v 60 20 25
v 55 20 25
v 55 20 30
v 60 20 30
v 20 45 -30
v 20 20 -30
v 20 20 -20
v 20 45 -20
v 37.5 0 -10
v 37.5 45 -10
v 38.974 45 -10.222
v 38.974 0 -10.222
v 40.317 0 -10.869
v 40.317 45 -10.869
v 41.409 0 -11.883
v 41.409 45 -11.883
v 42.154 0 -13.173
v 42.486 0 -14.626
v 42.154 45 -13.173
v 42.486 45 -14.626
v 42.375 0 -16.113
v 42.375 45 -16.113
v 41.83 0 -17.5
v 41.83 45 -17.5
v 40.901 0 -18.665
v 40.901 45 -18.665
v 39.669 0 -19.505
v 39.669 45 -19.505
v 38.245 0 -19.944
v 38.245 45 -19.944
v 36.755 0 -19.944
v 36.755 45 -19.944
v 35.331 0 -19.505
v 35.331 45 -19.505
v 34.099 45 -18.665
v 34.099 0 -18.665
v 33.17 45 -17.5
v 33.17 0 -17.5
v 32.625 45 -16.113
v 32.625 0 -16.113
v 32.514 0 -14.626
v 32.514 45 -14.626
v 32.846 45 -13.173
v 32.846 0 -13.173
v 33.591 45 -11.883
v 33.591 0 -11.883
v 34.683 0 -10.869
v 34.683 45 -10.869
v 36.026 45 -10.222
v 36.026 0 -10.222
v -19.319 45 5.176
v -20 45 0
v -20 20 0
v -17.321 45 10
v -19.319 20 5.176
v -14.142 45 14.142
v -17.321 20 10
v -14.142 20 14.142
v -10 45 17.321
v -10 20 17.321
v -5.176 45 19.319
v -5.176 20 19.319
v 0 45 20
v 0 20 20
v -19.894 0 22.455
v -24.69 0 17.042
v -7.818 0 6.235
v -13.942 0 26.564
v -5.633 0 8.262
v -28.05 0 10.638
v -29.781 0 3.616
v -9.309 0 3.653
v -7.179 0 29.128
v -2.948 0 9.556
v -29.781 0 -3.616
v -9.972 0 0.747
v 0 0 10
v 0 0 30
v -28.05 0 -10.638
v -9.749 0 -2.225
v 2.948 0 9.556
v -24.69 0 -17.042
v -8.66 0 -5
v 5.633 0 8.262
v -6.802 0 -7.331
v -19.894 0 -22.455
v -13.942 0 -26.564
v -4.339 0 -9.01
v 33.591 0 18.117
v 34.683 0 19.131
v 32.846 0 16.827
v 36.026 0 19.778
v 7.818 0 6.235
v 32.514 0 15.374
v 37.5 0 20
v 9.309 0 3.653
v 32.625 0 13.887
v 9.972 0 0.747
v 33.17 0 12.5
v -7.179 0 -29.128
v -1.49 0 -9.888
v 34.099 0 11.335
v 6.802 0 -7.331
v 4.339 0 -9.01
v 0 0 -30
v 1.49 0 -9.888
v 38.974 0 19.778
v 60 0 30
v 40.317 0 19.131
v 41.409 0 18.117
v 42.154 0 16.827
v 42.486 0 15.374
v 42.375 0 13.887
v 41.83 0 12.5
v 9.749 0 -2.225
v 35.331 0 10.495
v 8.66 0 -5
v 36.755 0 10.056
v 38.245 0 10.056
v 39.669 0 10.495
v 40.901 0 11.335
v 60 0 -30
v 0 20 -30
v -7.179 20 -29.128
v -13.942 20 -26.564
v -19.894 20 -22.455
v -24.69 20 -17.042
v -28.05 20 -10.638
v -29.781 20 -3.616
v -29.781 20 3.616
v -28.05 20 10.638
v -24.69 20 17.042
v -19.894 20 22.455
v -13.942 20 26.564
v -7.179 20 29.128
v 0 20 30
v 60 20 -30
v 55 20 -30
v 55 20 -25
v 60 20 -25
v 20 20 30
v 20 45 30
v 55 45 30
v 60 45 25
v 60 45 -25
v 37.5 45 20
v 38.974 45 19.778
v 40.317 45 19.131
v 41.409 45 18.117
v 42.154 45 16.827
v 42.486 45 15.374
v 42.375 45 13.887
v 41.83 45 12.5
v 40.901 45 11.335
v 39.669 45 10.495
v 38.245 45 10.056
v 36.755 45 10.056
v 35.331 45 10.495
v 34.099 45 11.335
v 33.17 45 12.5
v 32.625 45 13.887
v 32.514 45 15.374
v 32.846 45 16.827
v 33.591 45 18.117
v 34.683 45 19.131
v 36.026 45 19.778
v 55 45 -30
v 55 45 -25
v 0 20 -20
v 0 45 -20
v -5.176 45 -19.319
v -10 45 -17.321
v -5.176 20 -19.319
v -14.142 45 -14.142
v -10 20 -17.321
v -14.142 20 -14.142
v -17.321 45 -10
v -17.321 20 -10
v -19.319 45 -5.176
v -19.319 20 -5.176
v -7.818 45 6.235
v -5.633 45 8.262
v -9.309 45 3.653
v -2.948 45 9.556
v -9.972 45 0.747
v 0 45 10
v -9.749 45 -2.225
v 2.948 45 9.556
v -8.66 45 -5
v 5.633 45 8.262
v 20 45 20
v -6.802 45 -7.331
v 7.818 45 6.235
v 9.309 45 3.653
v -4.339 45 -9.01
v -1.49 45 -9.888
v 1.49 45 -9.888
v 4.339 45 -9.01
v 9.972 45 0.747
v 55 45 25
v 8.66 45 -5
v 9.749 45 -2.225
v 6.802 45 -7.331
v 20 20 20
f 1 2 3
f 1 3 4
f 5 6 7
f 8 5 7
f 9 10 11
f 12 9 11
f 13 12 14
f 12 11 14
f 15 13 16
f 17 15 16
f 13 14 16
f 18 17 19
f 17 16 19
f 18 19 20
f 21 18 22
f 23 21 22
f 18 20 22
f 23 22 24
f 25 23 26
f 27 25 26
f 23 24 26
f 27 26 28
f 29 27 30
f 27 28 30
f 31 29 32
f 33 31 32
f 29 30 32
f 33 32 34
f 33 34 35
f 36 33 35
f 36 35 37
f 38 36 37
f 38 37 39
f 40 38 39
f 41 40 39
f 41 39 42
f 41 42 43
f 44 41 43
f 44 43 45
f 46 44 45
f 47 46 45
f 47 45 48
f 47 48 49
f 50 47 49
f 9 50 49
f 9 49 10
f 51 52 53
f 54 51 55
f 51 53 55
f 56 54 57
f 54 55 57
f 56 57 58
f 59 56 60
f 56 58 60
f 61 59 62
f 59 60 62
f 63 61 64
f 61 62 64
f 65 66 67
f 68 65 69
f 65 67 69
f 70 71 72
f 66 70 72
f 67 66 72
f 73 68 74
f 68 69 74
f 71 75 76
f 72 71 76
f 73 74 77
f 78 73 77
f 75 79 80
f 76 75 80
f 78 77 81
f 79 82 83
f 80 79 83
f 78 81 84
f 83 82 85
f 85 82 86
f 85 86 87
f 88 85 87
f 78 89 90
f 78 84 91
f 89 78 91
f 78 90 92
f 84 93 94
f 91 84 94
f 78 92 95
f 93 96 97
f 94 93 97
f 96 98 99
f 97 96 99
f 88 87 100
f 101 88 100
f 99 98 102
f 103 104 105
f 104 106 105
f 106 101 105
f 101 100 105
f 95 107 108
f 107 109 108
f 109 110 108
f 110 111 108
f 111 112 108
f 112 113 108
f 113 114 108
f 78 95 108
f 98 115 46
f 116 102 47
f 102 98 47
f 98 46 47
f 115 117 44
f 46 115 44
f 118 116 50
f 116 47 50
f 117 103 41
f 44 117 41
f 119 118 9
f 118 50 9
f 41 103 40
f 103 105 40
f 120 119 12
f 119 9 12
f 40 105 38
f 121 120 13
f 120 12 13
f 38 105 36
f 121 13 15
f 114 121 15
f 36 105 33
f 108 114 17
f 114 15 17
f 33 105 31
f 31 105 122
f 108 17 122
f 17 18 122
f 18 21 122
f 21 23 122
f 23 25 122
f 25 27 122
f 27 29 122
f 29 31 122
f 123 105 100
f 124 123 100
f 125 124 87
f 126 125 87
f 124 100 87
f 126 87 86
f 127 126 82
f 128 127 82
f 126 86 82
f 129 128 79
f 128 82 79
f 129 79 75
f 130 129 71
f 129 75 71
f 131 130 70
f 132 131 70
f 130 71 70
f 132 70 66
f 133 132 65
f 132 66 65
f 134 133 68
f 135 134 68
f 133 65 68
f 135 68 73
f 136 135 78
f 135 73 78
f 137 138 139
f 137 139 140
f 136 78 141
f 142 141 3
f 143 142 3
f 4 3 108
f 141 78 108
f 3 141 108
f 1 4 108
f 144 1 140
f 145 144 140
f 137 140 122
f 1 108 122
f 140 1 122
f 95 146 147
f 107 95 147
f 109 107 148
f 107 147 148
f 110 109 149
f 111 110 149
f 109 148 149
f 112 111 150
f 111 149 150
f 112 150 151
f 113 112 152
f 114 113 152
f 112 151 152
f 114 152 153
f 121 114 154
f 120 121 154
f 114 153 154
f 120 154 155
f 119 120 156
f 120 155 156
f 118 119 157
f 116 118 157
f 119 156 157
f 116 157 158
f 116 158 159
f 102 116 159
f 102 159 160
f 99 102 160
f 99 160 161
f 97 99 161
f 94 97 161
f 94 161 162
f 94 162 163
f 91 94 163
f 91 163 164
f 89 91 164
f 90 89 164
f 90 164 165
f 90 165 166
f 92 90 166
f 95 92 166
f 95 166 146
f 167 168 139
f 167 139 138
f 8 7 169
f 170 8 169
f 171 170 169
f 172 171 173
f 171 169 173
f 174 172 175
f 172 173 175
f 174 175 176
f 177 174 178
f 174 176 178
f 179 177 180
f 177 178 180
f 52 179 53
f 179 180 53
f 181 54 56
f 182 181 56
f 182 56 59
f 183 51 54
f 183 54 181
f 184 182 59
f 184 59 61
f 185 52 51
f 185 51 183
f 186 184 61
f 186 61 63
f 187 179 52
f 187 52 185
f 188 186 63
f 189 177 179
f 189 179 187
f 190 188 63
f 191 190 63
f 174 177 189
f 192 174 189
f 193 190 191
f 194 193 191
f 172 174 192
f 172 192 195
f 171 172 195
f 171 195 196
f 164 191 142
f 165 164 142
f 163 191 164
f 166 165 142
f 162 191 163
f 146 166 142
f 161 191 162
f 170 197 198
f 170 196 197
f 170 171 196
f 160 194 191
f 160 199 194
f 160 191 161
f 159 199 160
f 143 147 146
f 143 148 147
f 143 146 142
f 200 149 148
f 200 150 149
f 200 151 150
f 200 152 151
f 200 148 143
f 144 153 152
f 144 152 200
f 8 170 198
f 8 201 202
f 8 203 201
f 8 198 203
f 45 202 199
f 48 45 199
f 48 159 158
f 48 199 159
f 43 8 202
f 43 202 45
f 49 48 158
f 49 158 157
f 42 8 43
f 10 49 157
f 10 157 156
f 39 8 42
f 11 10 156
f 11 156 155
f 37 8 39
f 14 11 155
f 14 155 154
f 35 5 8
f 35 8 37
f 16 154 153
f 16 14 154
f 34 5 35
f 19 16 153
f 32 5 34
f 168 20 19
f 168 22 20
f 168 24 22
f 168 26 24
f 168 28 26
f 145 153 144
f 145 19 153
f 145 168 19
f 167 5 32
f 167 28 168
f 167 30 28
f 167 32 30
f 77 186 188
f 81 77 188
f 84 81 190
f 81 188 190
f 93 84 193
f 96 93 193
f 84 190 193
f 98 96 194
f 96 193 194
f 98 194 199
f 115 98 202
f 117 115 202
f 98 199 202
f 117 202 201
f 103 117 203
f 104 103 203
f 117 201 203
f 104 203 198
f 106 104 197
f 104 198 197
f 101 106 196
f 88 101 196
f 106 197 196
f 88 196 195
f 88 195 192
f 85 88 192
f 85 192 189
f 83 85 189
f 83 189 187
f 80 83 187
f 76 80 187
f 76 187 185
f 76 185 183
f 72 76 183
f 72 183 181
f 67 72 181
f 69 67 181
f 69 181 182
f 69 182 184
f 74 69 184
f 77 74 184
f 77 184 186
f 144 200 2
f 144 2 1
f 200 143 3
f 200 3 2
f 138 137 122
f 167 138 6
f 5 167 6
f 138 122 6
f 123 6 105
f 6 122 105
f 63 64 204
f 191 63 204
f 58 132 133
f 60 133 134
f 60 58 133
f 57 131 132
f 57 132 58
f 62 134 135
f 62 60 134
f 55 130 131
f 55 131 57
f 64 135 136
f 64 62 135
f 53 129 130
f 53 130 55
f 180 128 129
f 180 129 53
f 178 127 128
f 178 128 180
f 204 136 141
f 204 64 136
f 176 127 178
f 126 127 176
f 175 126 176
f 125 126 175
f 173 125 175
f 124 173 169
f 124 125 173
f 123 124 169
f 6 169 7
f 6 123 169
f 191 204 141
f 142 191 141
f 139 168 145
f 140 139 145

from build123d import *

# Parameters (mm, degrees)
BOSS_EXTRUDE2_DEPTH = 45
BOSS_EXTRUDE3_DEPTH = 20
SKETCH3_W           = 5
SKETCH3_H           = 5
CUT_EXTRUDE1_DEPTH  = 25
SKETCH4_R           = 10
SKETCH4_R_2         = 5
CUT_EXTRUDE2_DEPTH  = 81.777472107


with BuildPart() as part:
    # Sketch1 → Boss-Extrude2 (new body)
    with BuildSketch(Plane(origin=(0, 0, 0), x_dir=(1, 0, 0), z_dir=(0, 1, 0))):
        with BuildLine():
            Line((60, 30), (20, 30))
            Line((20, 30), (20, 20))
            Line((20, 20), (0, 20))
            ThreePointArc((0, 20), (-20, 0), (0, -20))
            Line((0, -20), (20, -20))
            Line((20, -20), (20, -30))
            Line((20, -30), (60, -30))
            Line((60, -30), (60, 30))
        make_face()
    extrude(amount=BOSS_EXTRUDE2_DEPTH)

    # Sketch1<3> → Boss-Extrude3 (add)
    with BuildSketch(Plane(origin=(0, 0, 0), x_dir=(1, 0, 0), z_dir=(0, 1, 0))):
        with BuildLine():
            Line((20, 30), (0, 30))
            ThreePointArc((0, 30), (-30, 0), (0, -30))
            Line((0, -30), (20, -30))
            Line((20, -30), (20, -20))
            Line((20, -20), (0, -20))
            ThreePointArc((0, -20), (-20, 0), (0, 20))
            Line((0, 20), (20, 20))
            Line((20, 20), (20, 30))
        make_face()
    extrude(amount=BOSS_EXTRUDE3_DEPTH)

    # Sketch3 → Cut-Extrude1 (cut)
    with BuildSketch(Plane(origin=(0, 45, 0), x_dir=(1, 0, 0), z_dir=(0, 1, 0))):
        with Locations((57.5, -27.5)):
            Rectangle(SKETCH3_W, SKETCH3_H)
        with Locations((57.5, 27.5)):
            Rectangle(SKETCH3_W, SKETCH3_H)
    extrude(amount=-CUT_EXTRUDE1_DEPTH, mode=Mode.SUBTRACT)

    # Sketch4 → Cut-Extrude2 (cut, through all)
    with BuildSketch(Plane(origin=(0, 45, 0), x_dir=(1, 0, 0), z_dir=(0, 1, 0))):
        Circle(SKETCH4_R)
        with Locations((37.5, 15)):
            Circle(SKETCH4_R_2)
        with Locations((37.5, -15)):
            Circle(SKETCH4_R_2)
    extrude(amount=-CUT_EXTRUDE2_DEPTH, mode=Mode.SUBTRACT)


solid = part.part
